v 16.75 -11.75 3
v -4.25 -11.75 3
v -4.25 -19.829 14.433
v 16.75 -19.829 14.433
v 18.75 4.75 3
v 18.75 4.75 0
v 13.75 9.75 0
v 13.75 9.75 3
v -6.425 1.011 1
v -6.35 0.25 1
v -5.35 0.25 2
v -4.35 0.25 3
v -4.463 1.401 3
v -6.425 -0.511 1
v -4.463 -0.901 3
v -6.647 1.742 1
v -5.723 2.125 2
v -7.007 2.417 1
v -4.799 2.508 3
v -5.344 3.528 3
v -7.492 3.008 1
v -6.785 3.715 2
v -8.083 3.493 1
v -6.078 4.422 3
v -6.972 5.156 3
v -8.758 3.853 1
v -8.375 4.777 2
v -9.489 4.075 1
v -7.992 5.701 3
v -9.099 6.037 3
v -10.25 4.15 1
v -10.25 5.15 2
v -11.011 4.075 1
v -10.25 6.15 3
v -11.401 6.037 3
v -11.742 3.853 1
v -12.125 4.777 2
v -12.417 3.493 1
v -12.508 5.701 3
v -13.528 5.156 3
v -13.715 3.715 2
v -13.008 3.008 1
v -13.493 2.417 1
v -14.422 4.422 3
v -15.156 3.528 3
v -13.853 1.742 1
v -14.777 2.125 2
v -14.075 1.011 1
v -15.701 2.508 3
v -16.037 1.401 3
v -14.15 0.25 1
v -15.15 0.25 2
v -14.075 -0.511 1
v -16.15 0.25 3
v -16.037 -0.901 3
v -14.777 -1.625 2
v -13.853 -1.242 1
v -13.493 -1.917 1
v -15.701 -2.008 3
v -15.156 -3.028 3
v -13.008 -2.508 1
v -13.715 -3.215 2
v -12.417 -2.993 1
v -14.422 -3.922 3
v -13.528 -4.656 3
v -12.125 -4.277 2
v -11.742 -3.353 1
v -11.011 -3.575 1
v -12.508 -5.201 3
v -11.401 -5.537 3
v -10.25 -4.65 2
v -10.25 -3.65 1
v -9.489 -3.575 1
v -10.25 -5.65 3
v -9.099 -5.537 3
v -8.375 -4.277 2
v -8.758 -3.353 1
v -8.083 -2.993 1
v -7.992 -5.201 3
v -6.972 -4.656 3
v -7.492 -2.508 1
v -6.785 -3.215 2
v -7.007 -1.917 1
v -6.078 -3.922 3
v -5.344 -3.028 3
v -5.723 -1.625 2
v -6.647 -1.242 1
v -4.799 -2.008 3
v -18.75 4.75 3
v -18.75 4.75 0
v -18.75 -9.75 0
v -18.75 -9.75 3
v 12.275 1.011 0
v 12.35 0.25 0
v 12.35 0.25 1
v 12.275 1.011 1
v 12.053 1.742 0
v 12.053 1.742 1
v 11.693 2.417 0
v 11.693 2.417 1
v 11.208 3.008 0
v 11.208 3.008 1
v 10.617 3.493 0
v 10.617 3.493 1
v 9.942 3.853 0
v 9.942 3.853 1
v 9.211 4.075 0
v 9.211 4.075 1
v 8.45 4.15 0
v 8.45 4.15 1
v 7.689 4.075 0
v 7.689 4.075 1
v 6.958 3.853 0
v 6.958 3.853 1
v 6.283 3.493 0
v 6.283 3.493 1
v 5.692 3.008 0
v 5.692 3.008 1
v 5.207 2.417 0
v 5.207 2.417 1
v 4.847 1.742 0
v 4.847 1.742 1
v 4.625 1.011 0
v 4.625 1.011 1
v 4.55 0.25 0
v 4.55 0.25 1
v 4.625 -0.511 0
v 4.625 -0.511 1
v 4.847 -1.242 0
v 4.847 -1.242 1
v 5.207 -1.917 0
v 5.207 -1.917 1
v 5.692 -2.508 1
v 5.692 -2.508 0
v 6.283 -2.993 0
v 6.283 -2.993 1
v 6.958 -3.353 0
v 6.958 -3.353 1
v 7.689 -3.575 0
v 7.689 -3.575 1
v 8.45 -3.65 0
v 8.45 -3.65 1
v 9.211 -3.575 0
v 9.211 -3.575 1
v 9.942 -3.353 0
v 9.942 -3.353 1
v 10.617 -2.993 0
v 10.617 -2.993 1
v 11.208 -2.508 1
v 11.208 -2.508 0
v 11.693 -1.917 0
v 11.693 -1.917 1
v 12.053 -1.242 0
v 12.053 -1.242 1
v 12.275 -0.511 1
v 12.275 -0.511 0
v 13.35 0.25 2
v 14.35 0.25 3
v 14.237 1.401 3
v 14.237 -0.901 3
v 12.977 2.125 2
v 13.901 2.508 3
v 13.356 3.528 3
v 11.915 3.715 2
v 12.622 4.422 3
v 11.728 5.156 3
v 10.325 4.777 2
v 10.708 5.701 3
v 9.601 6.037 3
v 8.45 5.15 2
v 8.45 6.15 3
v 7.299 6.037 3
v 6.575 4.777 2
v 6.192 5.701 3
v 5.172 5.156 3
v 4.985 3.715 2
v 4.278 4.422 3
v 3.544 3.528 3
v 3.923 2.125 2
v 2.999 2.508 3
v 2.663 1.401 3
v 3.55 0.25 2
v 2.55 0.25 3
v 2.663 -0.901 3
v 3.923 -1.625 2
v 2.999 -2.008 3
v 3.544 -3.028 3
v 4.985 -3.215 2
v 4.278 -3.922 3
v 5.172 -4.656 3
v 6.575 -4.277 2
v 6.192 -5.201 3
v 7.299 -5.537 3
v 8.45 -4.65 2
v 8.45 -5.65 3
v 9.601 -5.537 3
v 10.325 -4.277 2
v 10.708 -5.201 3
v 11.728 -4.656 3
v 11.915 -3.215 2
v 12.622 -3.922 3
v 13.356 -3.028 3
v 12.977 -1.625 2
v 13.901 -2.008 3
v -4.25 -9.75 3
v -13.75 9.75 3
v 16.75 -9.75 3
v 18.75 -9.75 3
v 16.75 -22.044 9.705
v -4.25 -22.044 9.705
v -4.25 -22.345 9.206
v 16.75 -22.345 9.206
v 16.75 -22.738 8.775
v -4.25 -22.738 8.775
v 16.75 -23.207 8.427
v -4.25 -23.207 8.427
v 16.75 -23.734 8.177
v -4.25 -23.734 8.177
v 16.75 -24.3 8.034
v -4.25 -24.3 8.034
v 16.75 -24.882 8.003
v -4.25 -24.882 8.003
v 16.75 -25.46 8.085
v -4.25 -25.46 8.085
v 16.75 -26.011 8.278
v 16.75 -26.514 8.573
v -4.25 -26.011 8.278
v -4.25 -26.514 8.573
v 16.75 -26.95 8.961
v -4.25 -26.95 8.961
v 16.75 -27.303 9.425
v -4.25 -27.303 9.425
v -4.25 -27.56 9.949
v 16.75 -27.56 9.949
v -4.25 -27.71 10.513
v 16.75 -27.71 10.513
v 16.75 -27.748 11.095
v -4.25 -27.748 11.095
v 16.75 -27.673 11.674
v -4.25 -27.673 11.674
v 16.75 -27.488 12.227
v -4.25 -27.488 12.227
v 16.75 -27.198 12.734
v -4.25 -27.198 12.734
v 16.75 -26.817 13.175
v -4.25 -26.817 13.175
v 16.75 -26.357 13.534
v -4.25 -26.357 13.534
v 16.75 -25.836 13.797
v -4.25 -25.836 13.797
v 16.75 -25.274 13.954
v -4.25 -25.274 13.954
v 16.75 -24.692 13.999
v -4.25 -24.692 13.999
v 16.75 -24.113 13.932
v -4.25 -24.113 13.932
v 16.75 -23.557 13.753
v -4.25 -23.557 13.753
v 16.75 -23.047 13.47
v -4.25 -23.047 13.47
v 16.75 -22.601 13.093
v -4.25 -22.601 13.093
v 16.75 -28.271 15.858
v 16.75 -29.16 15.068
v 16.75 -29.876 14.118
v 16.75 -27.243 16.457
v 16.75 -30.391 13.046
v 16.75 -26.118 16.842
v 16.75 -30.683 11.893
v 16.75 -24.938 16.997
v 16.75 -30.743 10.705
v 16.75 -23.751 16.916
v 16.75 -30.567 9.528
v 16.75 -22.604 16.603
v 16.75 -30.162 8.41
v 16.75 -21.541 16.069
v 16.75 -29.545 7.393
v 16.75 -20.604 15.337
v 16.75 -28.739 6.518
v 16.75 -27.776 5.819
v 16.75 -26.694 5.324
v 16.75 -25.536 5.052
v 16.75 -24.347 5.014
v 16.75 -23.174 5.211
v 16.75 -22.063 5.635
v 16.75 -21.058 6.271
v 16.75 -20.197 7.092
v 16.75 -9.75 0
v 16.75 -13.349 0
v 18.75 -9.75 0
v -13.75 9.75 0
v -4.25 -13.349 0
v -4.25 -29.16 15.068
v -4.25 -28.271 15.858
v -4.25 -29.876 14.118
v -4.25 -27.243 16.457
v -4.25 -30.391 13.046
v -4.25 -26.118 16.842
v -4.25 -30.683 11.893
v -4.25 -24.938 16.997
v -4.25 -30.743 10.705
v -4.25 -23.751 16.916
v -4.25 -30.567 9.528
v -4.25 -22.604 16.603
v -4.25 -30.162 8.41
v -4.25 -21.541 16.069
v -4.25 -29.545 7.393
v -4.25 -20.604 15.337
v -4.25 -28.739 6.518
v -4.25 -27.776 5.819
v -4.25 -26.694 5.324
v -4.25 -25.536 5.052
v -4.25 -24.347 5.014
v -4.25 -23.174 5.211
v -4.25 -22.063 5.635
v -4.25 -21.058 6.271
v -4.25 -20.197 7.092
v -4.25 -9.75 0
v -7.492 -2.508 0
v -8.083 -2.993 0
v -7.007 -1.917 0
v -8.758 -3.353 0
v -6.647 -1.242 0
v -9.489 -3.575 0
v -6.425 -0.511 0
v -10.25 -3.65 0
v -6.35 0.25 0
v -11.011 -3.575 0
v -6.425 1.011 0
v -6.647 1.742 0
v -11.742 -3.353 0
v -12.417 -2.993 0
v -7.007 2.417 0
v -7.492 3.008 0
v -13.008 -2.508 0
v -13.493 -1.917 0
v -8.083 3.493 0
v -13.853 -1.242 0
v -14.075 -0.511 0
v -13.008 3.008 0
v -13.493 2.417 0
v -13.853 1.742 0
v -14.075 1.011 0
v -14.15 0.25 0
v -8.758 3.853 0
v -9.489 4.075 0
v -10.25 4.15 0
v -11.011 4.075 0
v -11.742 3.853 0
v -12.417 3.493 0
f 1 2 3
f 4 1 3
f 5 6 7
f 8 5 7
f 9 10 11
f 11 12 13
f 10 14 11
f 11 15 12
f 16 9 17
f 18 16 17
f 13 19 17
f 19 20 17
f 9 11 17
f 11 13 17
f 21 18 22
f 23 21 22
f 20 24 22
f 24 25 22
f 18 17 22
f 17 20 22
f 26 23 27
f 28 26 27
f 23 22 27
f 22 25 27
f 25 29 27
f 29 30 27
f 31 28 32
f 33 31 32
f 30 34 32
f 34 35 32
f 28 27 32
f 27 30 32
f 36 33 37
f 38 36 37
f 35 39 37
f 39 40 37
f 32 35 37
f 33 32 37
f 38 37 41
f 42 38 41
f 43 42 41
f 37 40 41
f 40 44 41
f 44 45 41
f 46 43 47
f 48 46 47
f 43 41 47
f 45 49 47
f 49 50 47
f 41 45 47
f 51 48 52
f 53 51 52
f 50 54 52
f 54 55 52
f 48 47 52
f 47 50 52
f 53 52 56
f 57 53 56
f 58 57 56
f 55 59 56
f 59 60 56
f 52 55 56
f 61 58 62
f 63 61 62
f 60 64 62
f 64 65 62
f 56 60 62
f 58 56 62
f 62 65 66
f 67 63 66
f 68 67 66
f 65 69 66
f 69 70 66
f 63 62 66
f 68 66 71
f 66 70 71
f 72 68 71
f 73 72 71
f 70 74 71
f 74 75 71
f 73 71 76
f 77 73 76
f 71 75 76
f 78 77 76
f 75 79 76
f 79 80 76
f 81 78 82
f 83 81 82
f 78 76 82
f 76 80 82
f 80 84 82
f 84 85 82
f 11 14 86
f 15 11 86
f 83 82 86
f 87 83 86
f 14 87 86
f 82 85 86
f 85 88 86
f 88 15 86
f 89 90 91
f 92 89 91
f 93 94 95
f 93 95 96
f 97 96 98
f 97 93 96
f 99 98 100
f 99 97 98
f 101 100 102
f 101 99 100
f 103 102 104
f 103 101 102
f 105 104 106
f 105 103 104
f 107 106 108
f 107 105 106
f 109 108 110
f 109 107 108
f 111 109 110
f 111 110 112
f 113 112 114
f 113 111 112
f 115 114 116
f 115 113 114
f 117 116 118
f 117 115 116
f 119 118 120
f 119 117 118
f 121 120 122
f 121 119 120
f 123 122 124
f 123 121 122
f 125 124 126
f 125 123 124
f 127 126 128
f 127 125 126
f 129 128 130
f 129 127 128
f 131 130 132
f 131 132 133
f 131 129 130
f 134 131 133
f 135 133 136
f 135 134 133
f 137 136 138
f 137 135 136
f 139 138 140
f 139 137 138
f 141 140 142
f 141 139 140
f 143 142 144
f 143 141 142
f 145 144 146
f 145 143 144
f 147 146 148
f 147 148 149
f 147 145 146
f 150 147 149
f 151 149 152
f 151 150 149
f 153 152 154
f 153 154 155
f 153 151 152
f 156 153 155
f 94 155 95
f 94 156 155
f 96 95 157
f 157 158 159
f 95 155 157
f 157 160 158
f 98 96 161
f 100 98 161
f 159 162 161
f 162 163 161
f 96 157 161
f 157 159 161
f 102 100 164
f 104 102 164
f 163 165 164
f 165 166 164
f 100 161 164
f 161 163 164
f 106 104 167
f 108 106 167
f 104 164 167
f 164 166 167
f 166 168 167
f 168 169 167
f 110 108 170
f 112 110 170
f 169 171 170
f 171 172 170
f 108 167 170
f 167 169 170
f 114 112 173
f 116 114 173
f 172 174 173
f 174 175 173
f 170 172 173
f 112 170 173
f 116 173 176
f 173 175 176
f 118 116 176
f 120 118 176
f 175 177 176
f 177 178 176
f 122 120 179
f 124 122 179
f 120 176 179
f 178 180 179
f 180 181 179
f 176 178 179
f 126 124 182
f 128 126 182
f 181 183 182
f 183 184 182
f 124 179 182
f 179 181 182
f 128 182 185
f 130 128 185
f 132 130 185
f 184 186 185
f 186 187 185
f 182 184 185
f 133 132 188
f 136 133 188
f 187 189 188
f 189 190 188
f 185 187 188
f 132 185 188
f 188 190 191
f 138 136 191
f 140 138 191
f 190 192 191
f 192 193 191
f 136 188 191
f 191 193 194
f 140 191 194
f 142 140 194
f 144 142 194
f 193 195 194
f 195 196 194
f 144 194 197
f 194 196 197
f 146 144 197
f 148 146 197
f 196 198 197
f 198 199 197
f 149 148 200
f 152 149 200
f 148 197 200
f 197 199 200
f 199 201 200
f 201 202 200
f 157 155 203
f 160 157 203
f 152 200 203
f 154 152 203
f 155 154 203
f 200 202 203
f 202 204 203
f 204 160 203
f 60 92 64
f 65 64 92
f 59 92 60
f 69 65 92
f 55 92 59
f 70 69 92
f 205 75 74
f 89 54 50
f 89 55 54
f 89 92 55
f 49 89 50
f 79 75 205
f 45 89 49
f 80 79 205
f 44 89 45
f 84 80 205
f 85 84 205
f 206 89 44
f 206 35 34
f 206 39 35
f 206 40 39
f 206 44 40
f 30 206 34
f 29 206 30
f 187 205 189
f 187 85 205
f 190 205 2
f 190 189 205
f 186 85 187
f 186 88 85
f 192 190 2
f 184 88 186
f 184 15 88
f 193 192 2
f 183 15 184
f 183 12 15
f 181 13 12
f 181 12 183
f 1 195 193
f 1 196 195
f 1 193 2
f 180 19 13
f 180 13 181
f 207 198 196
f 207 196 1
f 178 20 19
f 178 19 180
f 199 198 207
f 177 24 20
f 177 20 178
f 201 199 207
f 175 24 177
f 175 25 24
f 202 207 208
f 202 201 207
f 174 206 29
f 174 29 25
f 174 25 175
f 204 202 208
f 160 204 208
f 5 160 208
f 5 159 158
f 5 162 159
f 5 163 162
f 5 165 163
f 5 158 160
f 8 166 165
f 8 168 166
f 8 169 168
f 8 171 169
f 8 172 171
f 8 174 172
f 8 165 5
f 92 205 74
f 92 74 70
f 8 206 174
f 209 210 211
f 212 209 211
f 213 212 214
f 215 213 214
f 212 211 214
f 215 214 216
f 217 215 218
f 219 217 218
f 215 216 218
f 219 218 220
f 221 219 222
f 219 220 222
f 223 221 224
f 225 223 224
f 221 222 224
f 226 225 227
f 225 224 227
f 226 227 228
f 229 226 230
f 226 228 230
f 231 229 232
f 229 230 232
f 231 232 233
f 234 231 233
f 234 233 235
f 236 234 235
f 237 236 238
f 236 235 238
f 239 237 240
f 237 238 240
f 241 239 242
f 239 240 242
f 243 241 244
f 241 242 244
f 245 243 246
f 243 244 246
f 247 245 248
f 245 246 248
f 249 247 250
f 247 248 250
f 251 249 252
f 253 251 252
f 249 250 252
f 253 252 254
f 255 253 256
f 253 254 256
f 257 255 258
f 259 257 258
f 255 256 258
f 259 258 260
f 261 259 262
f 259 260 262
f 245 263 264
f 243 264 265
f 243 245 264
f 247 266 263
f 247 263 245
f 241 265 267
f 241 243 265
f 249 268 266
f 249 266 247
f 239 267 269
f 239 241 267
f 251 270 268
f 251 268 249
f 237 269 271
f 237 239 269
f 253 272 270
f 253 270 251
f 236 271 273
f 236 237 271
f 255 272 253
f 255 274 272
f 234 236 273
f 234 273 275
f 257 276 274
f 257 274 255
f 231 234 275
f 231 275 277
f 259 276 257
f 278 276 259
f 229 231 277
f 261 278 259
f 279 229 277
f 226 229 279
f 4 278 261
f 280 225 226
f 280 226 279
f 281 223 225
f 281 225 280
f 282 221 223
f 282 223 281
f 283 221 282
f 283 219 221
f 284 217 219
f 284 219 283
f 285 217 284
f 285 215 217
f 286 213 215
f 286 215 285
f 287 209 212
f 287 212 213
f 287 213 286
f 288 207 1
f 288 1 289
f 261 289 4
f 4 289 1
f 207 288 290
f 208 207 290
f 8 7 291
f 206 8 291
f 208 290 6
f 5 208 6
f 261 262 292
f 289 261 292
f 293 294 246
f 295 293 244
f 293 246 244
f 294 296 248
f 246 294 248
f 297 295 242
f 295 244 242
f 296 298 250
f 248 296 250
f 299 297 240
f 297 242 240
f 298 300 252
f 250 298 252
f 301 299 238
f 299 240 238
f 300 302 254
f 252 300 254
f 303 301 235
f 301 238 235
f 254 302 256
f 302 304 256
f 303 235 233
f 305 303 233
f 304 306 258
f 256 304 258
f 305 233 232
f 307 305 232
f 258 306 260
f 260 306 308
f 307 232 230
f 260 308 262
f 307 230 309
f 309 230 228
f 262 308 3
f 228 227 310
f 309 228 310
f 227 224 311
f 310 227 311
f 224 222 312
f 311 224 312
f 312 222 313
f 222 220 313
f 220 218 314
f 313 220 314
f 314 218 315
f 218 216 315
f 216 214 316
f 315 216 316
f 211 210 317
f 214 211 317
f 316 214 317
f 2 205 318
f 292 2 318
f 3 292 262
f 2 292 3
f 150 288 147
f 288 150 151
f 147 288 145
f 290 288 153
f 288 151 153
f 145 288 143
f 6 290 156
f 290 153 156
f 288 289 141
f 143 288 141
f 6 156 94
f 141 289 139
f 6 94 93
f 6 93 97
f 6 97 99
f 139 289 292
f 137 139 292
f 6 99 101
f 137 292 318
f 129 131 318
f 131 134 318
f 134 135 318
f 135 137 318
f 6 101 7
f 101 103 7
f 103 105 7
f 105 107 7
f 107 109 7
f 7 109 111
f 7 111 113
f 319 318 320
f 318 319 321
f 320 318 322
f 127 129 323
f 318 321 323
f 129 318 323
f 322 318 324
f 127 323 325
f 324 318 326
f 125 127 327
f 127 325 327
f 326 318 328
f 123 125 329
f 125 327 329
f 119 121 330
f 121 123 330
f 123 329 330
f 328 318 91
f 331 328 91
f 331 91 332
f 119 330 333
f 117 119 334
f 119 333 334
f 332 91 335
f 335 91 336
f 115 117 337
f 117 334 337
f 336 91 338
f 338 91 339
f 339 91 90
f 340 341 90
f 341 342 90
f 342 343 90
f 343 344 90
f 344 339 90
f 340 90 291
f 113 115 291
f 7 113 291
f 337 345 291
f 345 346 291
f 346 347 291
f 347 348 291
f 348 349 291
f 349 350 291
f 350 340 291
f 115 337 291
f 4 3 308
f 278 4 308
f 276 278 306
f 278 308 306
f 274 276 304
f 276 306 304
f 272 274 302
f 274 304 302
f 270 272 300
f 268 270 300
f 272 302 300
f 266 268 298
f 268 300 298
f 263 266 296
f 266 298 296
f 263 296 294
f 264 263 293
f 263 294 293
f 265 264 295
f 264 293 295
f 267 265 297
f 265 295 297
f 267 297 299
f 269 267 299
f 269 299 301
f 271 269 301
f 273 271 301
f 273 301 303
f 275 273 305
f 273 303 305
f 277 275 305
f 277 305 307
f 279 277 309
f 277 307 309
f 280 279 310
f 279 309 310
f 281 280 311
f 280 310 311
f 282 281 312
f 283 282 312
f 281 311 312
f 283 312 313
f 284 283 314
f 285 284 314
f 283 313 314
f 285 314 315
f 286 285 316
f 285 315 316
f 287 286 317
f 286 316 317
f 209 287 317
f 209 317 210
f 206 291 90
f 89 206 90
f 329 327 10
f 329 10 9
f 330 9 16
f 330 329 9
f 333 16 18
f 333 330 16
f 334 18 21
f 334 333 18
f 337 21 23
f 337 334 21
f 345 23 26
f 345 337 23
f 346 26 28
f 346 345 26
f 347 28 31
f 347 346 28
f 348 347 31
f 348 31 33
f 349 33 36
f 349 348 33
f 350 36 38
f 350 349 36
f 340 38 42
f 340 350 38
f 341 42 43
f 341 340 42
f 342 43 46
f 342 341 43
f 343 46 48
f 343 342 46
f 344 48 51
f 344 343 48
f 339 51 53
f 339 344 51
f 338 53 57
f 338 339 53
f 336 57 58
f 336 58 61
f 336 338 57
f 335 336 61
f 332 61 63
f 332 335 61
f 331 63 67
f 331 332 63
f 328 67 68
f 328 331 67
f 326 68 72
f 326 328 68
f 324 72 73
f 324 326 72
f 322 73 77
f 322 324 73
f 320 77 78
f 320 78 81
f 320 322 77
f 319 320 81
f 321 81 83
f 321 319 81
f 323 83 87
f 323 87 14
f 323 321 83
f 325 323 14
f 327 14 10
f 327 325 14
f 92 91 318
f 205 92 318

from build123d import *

# Parameters (mm, degrees)
SZKIC1_R                         = 3.9
DODANIE_WYCI_GNI_CIE1_DEPTH      = 3
SFAZOWANIE1_SIZE                 = 2
DODANIE_WYCI_GNI_CIE2_DEPTH      = 16.75
DODANIE_WYCI_GNI_CIE2_DEPTH_BACK = 4.25


with BuildPart() as part:
    # Szkic1 → Dodanie-wyciągnięcie1 (new body)
    with BuildSketch(Plane.XY):
        Polygon((-13.75, 9.75), (-18.75, 4.75), (-18.75, -9.75), (-4.25, -9.75), (-4.25, -11.75), (16.75, -11.75), (16.75, -9.75), (18.75, -9.75), (18.75, 4.75), (13.75, 9.75), align=None)
        with Locations((8.45, 0.25)):
            Circle(SZKIC1_R, mode=Mode.SUBTRACT)
        with Locations((-10.25, 0.25)):
            Circle(SZKIC1_R, mode=Mode.SUBTRACT)
    extrude(amount=DODANIE_WYCI_GNI_CIE1_DEPTH)

    # Sfazowanie1
    sfazowanie1_edges = [part.edges().sort_by_distance(p)[0] for p in [
        (4.55, 0.25, 3),
        (-14.15, 0.25, 3),
    ]]
    chamfer(sfazowanie1_edges, length=SFAZOWANIE1_SIZE)

    # Szkic2 → Dodanie-wyciągnięcie2 (add, two sides: drawn at the far end of the back side and taken through both)
    with BuildSketch(Plane(origin=(0, 0, 0), x_dir=(0, 0, -1), z_dir=(1, 0, 0)).offset(-DODANIE_WYCI_GNI_CIE2_DEPTH_BACK)):
        with BuildLine():
            Line((-3, -11.75), (-14.433393367, -19.829450235))
            ThreePointArc((-14.433393367, -19.829450235), (-11.300096726, -30.742490463), (-7.092187095, -20.19708903))
            Line((-7.092187095, -20.19708903), (-9.705385917, -22.043715762))
            ThreePointArc((-9.705385917, -22.043715762), (-10.51292291, -27.710195248), (-13.093480354, -22.601200333))
            Line((-13.093480354, -22.601200333), (0, -13.348643413))
            Line((0, -13.348643413), (0, -11.75))
            Line((0, -11.75), (-3, -11.75))
        make_face()
    extrude(amount=DODANIE_WYCI_GNI_CIE2_DEPTH + DODANIE_WYCI_GNI_CIE2_DEPTH_BACK)


solid = part.part
